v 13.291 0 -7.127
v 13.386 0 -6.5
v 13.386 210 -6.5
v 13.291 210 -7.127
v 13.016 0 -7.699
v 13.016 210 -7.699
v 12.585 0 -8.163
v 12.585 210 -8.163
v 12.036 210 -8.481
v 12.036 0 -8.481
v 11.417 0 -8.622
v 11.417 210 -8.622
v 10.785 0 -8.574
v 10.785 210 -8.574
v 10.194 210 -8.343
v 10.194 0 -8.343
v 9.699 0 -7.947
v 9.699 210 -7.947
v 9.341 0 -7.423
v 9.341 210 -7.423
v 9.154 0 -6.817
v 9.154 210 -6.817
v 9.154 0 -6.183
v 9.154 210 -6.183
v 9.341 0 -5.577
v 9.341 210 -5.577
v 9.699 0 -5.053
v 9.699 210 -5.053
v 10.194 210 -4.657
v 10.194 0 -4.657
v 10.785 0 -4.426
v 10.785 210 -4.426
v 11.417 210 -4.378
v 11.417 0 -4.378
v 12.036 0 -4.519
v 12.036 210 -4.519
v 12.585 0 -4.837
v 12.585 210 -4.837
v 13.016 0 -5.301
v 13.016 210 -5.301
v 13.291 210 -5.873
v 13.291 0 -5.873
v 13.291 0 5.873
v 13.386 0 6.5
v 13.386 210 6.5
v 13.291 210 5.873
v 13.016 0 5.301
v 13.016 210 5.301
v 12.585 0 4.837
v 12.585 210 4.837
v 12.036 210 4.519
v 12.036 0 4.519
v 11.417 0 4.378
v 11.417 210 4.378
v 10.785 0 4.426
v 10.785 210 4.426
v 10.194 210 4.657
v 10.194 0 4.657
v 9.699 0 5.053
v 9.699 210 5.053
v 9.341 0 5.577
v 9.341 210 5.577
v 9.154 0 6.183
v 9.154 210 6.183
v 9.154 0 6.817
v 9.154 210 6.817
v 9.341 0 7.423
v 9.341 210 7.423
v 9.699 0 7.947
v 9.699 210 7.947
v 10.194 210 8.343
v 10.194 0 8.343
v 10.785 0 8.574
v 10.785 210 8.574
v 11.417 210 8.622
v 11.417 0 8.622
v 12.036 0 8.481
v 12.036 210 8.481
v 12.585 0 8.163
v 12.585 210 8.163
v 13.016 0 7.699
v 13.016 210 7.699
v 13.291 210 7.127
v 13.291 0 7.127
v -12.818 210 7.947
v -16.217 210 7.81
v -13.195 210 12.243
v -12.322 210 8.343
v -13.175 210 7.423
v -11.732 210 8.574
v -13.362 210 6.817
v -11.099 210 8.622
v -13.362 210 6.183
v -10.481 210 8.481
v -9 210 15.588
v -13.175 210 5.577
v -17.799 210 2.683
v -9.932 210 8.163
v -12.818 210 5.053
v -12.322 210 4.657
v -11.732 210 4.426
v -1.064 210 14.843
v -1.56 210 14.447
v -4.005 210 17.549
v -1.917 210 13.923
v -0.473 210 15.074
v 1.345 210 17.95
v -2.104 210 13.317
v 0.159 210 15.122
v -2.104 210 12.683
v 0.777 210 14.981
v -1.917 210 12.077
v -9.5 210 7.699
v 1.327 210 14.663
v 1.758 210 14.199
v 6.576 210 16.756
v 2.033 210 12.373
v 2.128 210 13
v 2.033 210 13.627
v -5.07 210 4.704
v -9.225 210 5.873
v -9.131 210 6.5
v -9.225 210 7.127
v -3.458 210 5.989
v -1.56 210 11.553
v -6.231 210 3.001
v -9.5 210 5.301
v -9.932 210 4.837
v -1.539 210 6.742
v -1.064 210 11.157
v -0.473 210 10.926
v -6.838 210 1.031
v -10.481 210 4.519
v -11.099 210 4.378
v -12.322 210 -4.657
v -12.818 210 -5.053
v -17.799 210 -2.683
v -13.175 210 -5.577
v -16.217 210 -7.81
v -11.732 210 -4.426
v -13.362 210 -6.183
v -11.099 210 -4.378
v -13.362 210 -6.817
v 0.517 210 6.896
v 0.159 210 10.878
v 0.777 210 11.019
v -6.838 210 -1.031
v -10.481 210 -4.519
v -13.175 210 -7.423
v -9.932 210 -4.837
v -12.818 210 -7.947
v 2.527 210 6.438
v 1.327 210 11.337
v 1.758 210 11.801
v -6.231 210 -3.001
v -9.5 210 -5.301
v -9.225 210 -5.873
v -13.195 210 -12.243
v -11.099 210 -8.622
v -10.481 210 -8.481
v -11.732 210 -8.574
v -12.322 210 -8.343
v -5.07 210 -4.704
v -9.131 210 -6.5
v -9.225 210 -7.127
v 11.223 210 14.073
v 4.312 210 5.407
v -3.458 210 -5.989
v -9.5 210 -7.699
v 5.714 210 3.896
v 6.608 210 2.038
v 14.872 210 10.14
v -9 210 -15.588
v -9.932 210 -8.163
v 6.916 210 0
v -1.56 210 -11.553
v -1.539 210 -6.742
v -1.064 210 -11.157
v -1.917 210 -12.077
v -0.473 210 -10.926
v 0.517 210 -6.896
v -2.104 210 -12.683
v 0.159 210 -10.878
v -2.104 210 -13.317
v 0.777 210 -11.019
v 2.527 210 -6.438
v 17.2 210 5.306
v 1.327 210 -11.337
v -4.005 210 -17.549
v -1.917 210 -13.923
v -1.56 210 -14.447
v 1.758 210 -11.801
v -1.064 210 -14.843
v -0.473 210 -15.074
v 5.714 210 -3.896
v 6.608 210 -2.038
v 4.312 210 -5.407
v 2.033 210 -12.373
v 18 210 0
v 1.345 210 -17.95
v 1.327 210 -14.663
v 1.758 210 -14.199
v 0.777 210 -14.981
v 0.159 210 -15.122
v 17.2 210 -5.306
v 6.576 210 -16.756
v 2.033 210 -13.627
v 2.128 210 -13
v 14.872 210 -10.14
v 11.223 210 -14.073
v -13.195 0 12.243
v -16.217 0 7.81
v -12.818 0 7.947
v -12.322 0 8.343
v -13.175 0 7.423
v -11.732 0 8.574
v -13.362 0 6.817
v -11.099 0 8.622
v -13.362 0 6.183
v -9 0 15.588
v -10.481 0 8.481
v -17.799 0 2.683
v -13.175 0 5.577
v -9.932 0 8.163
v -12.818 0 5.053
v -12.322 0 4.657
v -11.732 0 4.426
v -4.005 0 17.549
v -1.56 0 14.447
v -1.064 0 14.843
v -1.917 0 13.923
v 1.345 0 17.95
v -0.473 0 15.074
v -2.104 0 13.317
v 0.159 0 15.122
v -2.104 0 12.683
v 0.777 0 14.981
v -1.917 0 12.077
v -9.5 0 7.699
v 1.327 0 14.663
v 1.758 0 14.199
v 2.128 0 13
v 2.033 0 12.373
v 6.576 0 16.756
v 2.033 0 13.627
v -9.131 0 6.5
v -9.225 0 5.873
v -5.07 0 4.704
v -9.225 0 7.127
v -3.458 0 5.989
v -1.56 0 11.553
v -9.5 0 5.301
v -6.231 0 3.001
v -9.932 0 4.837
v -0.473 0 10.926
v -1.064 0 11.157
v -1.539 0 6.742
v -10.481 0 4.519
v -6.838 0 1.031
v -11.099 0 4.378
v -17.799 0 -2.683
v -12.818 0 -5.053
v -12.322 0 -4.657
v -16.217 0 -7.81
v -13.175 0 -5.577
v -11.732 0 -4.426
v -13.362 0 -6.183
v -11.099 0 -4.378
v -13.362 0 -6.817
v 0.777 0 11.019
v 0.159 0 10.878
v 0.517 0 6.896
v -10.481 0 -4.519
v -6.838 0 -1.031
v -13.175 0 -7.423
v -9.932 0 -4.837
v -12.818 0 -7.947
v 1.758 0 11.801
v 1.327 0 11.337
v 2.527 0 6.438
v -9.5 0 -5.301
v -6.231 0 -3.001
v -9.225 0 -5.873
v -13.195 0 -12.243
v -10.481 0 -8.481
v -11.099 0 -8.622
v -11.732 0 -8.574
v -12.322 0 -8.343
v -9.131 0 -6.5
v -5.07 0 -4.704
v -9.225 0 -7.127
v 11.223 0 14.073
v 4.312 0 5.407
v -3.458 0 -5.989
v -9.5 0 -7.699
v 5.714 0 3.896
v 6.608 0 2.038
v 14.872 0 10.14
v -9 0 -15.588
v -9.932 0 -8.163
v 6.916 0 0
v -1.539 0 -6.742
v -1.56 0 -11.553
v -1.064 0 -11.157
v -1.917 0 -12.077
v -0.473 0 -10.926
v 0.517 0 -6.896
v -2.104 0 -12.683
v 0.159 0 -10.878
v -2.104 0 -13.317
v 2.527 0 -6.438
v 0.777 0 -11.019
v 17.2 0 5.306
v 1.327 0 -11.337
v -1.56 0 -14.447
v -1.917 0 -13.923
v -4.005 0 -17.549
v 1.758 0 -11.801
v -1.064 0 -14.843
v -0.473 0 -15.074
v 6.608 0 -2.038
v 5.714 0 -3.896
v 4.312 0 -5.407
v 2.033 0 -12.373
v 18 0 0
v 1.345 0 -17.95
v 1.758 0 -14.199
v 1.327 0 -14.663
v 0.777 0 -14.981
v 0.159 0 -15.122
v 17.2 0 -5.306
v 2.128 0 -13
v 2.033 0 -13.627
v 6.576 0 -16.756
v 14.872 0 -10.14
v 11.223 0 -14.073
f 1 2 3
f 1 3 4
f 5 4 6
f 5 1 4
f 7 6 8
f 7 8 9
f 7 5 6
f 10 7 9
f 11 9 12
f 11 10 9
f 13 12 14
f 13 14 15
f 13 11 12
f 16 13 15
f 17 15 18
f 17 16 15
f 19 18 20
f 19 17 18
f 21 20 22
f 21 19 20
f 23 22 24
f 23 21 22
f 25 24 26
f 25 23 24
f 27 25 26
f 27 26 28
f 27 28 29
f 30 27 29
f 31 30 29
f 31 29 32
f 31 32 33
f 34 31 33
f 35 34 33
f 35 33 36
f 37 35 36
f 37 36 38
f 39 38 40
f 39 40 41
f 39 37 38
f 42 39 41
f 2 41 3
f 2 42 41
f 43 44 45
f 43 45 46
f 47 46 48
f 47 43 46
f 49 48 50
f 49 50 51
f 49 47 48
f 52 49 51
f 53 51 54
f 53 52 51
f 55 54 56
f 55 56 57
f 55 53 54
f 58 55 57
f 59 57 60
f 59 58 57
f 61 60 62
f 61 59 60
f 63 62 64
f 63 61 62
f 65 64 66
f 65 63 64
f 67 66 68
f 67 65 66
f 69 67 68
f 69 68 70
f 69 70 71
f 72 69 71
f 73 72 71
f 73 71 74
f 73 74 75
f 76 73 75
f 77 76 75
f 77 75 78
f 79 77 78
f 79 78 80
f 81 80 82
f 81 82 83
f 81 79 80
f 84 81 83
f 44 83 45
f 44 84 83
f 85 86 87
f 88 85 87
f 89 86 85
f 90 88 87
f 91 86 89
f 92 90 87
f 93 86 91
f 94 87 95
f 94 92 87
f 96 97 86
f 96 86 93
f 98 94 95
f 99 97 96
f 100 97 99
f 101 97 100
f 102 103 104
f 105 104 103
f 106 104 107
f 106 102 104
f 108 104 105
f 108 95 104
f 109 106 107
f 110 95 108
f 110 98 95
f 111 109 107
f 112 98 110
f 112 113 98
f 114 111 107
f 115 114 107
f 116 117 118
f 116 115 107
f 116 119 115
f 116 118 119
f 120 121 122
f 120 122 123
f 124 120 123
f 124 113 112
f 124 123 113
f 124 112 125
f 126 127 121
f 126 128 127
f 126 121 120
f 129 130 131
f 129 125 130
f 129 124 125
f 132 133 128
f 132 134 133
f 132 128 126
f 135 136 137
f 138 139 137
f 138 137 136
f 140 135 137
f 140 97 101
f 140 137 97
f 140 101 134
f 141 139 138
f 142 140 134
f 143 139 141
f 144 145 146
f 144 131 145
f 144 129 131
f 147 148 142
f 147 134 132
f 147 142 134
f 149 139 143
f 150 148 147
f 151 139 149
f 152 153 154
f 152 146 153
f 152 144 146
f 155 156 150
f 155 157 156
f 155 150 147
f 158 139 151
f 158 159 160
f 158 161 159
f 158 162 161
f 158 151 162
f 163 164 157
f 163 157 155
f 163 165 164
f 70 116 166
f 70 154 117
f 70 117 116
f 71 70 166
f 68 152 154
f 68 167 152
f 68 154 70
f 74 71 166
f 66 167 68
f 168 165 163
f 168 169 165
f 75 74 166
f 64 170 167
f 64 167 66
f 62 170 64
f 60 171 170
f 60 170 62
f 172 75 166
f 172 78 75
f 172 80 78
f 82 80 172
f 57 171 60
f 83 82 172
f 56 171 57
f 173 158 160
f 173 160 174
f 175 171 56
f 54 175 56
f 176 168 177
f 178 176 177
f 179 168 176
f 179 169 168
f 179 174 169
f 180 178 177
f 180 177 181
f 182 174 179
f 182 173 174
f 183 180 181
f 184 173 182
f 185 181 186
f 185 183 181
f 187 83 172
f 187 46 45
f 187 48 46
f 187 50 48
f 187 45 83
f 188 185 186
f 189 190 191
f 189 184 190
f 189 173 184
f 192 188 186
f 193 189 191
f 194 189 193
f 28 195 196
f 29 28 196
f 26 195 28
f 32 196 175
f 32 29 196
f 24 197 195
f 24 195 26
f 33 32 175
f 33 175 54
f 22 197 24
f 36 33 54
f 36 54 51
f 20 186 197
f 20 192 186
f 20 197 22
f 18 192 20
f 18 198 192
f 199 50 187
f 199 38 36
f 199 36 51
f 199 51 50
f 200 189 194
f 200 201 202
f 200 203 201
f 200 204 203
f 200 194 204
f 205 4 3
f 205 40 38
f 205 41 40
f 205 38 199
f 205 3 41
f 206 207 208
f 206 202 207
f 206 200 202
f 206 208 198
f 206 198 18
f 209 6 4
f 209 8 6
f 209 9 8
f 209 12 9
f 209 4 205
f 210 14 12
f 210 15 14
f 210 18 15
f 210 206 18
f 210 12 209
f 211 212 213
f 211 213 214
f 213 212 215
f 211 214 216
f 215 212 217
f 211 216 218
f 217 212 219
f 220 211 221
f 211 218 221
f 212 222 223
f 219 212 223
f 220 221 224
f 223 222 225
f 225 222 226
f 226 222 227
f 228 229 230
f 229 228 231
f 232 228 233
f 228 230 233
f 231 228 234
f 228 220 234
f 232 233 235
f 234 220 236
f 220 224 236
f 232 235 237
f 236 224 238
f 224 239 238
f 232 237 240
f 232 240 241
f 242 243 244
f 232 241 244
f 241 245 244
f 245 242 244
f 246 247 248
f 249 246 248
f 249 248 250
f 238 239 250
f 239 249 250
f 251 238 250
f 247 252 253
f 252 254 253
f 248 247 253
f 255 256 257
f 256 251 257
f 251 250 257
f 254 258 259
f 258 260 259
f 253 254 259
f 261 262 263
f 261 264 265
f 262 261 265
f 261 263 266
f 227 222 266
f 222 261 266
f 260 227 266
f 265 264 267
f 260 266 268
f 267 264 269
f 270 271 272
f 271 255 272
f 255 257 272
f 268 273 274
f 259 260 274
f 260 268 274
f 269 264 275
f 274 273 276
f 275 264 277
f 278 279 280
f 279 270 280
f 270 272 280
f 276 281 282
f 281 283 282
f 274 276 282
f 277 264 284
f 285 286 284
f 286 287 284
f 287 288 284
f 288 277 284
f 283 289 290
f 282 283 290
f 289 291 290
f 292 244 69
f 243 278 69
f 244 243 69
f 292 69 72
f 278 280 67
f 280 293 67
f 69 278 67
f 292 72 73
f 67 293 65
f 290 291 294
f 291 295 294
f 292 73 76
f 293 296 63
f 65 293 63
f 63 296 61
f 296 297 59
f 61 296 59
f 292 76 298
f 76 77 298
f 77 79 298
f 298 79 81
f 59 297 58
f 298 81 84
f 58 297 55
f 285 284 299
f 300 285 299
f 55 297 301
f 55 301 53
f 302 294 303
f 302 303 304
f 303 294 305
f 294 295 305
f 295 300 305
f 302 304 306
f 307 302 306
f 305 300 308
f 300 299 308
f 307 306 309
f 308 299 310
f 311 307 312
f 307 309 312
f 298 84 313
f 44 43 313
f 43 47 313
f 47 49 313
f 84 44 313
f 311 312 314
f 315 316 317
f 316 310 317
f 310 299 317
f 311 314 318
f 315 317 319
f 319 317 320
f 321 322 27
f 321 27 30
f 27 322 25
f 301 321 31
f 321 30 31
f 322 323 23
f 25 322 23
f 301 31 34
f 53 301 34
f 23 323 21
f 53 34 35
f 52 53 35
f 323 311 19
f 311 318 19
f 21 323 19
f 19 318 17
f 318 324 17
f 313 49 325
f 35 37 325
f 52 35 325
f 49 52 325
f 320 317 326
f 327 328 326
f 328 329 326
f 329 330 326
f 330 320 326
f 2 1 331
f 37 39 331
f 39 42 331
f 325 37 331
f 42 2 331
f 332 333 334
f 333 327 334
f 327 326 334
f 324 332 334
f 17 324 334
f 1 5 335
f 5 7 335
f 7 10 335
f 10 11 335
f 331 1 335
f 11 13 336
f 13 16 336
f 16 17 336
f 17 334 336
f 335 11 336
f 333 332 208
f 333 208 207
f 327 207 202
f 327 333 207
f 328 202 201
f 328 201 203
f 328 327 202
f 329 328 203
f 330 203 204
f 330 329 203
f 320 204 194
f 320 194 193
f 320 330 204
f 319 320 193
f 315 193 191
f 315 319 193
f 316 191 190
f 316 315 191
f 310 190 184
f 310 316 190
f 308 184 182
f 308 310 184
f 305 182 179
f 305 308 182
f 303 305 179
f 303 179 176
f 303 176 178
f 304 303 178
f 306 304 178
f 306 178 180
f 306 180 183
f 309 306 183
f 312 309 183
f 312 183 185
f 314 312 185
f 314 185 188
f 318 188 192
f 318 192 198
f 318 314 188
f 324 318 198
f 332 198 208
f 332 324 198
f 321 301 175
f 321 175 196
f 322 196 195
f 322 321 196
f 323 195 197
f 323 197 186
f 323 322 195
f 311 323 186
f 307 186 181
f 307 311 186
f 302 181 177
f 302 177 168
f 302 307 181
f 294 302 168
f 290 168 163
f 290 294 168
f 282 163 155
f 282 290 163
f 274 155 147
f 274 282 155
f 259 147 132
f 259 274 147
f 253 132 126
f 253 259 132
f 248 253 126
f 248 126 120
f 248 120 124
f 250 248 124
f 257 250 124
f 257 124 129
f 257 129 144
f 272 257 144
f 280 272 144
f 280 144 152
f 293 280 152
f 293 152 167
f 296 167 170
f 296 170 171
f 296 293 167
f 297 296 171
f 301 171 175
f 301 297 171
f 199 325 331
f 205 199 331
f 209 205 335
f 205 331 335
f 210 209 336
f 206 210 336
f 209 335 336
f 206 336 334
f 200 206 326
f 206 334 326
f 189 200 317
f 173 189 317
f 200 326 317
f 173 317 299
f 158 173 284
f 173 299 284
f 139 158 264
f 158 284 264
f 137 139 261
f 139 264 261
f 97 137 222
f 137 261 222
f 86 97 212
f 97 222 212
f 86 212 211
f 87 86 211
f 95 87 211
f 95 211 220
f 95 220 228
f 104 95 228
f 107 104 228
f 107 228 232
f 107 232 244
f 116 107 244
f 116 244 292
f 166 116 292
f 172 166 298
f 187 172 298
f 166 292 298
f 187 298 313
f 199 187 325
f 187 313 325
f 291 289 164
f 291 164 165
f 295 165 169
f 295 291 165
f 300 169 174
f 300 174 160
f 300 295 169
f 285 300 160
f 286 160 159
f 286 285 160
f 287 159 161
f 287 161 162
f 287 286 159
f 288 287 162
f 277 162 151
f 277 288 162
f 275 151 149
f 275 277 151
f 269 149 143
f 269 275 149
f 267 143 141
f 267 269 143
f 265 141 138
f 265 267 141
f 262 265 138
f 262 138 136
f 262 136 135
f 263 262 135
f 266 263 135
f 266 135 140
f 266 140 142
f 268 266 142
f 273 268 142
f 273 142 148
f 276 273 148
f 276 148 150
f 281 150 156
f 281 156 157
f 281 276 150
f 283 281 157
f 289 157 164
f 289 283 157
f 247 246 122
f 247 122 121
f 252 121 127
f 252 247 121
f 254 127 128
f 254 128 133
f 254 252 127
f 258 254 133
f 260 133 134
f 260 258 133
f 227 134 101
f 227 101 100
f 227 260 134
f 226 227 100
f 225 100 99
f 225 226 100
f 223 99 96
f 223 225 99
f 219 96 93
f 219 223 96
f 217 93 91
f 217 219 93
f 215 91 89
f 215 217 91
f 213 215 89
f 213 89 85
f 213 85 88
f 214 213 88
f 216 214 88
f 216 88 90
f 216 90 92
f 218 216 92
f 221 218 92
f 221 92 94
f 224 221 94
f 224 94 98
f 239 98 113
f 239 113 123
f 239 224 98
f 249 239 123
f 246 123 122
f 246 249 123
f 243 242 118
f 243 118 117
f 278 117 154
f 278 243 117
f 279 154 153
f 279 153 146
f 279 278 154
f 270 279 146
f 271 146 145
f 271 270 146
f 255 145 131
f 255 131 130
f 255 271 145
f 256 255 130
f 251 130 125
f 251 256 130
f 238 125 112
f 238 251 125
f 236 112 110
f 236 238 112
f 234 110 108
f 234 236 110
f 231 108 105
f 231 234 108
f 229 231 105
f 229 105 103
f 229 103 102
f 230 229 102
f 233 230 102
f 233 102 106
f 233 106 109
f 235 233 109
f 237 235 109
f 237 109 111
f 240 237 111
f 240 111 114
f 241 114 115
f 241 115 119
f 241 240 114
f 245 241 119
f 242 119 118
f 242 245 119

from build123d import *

# Parameters (mm, degrees)
SKETCH1_R           = 18
SKETCH1_R_2         = 2.12769231
SKETCH1_R_3         = 6.9156293
BOSS_EXTRUDE1_DEPTH = 210


with BuildPart() as part:
    # Sketch1 → Boss-Extrude1 (new body)
    with BuildSketch(Plane(origin=(0, 0, 0), x_dir=(1, 0, 0), z_dir=(0, 1, 0))):
        Circle(SKETCH1_R)
        with Locations((0, 13)):
            Circle(SKETCH1_R_2, mode=Mode.SUBTRACT)
        Circle(SKETCH1_R_3, mode=Mode.SUBTRACT)
        with Locations((11.258330249, 6.5)):
            Circle(SKETCH1_R_2, mode=Mode.SUBTRACT)
        with Locations((11.258330249, -6.5)):
            Circle(SKETCH1_R_2, mode=Mode.SUBTRACT)
        with Locations((0, -13)):
            Circle(SKETCH1_R_2, mode=Mode.SUBTRACT)
        with Locations((-11.258330249, -6.5)):
            Circle(SKETCH1_R_2, mode=Mode.SUBTRACT)
        with Locations((-11.258330249, 6.5)):
            Circle(SKETCH1_R_2, mode=Mode.SUBTRACT)
    extrude(amount=BOSS_EXTRUDE1_DEPTH)


solid = part.part
